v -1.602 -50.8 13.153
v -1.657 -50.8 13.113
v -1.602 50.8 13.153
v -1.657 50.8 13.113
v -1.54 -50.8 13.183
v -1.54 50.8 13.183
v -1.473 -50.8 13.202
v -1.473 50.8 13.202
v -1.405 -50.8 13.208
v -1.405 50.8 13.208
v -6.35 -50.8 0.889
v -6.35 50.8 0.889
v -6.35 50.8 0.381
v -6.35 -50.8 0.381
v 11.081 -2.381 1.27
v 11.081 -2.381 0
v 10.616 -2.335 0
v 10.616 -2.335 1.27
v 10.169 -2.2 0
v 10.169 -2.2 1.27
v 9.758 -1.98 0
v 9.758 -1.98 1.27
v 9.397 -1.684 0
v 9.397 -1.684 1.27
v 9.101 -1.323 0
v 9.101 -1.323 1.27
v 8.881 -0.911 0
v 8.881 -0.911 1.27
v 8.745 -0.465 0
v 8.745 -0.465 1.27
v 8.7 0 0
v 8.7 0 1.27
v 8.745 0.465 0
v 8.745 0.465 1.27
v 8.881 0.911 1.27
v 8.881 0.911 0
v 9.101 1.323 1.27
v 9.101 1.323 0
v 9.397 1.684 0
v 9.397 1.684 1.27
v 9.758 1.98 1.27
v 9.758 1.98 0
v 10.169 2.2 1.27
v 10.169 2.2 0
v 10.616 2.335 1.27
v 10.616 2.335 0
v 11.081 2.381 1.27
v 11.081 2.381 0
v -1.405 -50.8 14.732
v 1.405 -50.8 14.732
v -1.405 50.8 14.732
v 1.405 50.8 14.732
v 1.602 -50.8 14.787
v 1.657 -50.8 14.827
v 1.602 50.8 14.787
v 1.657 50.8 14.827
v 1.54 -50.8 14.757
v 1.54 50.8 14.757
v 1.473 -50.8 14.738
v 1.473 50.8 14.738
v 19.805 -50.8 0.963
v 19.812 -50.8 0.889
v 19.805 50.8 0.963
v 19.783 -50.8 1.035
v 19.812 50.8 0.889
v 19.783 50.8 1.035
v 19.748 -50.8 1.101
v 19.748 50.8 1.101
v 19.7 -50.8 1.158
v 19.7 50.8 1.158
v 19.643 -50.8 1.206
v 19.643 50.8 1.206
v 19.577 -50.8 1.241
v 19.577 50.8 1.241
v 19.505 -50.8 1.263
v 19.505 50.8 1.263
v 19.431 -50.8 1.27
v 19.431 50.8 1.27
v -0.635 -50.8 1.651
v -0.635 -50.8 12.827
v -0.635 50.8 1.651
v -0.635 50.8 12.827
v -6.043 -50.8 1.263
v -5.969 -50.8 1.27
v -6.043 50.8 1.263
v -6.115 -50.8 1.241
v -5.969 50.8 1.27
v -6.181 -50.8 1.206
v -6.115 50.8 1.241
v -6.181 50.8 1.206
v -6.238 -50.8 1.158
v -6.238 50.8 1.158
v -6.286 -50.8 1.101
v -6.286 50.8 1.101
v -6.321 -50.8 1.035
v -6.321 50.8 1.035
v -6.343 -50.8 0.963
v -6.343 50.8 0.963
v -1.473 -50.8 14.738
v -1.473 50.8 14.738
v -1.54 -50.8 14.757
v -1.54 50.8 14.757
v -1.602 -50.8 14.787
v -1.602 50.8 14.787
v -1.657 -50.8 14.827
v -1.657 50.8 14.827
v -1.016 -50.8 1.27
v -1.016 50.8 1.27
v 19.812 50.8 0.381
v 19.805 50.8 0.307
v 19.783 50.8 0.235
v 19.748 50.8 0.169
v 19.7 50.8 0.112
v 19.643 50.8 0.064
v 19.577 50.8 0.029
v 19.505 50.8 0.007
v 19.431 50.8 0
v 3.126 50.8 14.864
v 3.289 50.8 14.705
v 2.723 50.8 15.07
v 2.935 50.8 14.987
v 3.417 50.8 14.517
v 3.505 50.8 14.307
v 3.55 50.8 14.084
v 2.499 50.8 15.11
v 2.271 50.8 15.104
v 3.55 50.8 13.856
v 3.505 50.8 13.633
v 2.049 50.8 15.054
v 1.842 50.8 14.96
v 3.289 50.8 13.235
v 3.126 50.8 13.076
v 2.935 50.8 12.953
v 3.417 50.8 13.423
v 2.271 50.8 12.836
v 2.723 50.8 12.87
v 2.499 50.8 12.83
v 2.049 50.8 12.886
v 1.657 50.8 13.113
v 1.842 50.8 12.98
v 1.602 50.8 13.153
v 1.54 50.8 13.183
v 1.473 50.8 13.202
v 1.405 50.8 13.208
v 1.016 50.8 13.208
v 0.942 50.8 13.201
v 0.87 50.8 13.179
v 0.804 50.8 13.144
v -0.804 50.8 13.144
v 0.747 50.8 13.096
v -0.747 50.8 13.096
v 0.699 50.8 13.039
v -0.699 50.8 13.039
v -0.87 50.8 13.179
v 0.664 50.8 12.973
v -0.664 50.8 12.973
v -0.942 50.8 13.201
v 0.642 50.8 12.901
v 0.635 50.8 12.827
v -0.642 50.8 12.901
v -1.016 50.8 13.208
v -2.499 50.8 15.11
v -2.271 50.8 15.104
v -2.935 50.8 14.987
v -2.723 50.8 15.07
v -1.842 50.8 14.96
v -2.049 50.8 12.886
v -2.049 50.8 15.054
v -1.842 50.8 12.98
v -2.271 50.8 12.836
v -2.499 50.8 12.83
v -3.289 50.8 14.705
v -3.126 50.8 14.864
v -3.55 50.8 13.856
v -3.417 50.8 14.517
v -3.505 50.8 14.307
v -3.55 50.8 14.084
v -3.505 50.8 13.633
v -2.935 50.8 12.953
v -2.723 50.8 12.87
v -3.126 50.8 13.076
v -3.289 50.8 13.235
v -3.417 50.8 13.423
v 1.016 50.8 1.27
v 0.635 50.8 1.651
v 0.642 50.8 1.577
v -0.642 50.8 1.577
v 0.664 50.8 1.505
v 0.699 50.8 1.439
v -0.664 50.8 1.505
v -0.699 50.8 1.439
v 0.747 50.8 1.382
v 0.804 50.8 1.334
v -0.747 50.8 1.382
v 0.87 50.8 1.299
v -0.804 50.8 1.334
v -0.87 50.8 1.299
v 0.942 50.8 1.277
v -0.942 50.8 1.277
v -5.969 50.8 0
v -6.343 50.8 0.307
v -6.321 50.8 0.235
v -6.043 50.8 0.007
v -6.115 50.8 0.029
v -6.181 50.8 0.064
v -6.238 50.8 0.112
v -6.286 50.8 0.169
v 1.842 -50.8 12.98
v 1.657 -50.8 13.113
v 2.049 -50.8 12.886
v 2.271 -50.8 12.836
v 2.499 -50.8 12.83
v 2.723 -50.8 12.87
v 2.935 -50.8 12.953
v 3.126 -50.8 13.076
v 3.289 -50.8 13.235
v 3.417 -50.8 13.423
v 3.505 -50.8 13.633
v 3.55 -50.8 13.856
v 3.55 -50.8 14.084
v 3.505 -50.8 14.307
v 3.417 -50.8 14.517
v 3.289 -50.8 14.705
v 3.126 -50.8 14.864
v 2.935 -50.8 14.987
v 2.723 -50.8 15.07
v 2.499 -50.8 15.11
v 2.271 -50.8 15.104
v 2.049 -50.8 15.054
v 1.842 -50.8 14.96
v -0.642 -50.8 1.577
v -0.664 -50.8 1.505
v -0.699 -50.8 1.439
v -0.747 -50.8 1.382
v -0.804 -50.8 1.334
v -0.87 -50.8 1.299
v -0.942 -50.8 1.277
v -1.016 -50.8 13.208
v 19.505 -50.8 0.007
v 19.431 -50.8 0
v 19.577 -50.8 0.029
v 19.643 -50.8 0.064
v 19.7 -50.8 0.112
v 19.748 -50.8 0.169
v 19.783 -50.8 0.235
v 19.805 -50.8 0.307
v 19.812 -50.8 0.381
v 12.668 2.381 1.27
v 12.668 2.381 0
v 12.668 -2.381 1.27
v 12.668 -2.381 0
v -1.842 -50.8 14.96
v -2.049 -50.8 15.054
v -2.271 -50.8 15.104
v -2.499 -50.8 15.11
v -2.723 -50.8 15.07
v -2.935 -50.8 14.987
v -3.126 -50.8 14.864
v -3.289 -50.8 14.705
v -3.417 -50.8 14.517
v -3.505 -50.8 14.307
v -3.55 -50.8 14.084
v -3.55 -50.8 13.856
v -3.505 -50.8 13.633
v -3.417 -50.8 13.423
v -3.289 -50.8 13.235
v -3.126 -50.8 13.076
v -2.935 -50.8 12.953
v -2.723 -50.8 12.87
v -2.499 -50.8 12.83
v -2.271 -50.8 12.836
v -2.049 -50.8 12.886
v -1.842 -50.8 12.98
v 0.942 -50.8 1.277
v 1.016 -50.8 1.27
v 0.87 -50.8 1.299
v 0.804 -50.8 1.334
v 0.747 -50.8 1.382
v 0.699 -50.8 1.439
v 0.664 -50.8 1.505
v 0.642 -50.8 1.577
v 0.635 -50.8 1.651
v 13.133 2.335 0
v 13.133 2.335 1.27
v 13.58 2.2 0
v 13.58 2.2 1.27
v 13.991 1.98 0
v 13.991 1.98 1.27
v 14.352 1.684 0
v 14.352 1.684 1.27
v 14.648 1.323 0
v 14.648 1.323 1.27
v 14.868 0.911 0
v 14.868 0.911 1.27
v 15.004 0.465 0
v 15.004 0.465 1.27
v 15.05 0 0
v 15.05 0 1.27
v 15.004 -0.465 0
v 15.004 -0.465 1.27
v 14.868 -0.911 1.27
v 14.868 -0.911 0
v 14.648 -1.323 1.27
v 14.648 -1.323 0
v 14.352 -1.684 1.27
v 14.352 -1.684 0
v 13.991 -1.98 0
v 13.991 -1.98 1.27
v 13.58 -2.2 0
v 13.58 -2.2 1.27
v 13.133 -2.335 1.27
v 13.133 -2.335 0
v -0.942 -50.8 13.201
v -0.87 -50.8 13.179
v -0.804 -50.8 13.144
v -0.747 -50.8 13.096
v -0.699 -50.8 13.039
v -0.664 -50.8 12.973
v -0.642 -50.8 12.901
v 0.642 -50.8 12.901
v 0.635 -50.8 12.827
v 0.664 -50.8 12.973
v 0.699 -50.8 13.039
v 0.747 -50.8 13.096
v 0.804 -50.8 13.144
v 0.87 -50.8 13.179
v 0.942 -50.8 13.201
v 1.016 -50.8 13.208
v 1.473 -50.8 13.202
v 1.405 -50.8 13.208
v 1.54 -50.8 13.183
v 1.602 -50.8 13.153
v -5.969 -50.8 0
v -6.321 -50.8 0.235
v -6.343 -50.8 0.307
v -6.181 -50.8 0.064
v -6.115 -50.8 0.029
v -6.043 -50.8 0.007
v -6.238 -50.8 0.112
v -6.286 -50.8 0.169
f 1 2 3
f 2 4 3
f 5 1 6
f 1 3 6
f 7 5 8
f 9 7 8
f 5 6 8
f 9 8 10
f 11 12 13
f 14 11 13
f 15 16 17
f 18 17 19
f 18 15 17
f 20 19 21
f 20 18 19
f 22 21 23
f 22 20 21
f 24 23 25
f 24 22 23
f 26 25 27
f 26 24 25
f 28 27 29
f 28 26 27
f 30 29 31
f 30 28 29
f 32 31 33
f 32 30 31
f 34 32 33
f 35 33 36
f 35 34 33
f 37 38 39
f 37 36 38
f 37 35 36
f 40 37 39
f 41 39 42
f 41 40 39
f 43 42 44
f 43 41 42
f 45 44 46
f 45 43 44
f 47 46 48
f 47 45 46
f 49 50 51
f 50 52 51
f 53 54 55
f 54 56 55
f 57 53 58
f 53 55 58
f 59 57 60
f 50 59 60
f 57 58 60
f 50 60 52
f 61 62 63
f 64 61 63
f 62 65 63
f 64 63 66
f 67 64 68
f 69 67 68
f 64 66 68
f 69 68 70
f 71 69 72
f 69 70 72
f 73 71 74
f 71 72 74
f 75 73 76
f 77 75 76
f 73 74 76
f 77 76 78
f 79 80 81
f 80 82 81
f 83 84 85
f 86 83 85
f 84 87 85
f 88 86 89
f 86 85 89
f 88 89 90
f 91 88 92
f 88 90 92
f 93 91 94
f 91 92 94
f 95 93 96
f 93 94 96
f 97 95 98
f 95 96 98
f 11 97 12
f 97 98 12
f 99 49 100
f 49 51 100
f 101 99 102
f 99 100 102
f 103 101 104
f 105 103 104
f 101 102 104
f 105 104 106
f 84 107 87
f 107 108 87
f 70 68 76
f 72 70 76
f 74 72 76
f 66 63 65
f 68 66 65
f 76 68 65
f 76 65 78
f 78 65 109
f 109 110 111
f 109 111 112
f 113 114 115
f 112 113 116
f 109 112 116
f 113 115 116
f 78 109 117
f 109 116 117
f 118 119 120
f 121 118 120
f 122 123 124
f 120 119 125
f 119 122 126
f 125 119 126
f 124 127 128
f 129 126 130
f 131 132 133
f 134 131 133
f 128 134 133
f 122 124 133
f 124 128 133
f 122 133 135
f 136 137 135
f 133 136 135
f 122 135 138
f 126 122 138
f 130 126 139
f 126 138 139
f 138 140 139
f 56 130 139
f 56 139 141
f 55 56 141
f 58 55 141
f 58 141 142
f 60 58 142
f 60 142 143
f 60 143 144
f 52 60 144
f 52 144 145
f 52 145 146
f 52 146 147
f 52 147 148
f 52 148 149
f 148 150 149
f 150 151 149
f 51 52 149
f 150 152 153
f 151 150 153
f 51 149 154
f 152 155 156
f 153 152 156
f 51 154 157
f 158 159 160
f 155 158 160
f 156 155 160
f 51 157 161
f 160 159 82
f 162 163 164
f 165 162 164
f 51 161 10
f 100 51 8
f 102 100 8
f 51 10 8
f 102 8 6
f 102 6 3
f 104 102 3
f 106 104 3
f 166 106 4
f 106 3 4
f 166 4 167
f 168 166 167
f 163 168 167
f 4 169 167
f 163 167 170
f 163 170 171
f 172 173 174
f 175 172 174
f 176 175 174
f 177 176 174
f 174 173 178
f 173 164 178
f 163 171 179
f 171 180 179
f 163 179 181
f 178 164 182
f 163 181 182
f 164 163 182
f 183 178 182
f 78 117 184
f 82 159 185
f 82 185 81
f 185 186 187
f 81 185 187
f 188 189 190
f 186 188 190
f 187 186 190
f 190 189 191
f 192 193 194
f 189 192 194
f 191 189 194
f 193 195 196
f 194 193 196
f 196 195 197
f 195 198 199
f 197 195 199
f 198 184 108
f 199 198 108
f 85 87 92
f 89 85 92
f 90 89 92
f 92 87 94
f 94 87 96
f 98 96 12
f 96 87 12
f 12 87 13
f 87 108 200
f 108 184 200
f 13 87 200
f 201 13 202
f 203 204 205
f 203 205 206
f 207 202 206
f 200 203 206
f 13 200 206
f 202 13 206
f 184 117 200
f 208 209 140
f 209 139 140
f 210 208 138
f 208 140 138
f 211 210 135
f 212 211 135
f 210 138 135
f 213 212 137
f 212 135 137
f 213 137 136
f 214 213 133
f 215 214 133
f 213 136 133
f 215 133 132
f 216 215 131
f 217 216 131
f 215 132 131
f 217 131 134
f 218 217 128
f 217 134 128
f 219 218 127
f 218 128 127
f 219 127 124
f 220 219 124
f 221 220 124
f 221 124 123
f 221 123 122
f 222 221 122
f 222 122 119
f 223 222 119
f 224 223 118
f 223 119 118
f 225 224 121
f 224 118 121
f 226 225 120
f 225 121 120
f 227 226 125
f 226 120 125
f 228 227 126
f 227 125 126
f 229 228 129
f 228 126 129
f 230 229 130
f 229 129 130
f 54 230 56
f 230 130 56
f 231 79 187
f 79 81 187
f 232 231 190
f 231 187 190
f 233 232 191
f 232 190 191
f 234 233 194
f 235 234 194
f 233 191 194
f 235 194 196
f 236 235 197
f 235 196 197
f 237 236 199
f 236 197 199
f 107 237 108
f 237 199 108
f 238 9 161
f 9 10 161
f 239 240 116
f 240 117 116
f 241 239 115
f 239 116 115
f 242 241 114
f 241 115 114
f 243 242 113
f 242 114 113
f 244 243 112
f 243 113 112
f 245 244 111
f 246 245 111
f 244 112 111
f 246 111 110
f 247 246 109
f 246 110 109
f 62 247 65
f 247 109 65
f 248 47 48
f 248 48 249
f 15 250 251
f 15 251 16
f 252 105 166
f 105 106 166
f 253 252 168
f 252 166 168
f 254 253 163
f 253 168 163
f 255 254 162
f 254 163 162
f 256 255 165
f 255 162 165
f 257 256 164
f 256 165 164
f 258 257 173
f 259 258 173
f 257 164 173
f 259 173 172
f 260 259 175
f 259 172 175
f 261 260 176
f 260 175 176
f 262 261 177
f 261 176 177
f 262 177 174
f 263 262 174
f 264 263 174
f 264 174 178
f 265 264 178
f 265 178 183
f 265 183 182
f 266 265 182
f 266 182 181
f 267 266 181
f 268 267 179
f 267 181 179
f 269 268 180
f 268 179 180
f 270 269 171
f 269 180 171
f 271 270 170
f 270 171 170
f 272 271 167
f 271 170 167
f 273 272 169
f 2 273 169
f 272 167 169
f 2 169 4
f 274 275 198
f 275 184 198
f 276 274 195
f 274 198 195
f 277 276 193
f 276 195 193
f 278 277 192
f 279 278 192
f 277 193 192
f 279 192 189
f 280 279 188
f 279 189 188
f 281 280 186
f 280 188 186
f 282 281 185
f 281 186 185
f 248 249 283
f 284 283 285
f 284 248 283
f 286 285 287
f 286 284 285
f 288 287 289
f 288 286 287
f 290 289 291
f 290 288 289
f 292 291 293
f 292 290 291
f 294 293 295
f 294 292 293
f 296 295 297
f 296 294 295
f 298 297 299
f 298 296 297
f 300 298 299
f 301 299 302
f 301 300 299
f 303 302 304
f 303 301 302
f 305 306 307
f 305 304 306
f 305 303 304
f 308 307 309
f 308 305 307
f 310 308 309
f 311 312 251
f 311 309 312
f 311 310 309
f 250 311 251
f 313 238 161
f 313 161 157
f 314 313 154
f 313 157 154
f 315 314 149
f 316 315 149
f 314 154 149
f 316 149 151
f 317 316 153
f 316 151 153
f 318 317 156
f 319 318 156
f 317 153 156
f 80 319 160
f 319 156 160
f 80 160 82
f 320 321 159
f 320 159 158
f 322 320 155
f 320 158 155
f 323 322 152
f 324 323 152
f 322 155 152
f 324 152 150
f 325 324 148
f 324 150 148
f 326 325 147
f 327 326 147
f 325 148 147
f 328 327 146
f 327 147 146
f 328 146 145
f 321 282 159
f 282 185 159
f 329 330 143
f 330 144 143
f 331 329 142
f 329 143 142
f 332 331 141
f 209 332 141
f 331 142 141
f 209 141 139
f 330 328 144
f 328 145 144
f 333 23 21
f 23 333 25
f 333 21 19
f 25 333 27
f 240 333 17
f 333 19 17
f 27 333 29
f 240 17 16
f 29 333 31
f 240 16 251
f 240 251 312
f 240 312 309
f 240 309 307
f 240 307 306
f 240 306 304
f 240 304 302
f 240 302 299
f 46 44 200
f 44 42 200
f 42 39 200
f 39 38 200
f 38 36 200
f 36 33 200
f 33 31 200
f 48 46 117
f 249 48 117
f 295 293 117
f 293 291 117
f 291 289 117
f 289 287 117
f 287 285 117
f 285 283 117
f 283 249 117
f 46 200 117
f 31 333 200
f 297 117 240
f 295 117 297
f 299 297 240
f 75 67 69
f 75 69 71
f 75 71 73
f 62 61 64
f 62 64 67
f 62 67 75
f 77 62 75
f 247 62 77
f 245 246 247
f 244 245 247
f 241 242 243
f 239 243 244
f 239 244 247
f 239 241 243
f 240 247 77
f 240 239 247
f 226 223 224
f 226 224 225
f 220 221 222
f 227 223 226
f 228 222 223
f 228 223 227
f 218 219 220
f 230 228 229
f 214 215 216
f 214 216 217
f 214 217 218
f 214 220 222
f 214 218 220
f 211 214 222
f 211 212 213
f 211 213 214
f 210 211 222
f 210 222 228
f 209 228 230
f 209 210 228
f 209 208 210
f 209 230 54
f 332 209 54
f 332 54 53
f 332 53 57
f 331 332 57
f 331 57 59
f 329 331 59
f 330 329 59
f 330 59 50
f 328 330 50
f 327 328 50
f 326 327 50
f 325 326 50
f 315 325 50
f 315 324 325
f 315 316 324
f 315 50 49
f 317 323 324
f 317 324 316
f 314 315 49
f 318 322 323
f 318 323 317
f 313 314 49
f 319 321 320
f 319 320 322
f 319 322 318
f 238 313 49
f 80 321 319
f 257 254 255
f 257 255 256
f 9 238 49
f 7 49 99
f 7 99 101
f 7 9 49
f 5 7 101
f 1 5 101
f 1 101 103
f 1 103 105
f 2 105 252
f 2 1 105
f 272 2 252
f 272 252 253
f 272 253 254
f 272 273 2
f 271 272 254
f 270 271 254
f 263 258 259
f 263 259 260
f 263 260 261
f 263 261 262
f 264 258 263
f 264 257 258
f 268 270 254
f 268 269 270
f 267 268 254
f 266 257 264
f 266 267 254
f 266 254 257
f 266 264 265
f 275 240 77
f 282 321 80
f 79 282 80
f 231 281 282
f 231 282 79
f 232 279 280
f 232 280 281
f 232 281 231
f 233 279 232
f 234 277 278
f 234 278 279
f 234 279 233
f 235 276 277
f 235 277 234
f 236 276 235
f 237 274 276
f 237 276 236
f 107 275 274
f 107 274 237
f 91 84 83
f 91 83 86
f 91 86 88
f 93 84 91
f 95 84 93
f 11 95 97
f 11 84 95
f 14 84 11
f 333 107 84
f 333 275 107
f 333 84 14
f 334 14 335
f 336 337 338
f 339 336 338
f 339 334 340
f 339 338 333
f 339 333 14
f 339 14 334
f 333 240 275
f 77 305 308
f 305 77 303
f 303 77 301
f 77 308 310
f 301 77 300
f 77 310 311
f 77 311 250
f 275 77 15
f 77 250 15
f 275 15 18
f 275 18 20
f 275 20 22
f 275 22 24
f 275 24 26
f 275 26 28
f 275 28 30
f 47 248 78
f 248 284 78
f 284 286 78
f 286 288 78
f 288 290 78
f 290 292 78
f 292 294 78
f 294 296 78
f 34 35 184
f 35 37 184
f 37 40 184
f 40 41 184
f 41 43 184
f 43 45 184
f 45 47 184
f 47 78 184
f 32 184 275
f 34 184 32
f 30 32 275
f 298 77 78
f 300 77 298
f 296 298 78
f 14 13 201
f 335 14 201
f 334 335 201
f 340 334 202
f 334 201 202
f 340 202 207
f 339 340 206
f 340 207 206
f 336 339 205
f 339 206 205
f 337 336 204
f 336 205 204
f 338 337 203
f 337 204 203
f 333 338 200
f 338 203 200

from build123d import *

# Parameters (mm, degrees)
BOSS_EXTRUDE1_DEPTH = 50.8
CUT_EXTRUDE1_DEPTH  = 2.27


with BuildPart() as part:
    # Sketch2 → Boss-Extrude1 (new body, symmetric)
    with BuildSketch(Plane(origin=(0, 0, 0), x_dir=(1, 0, 0), z_dir=(0, 1, 0))):
        with BuildLine():
            Line((-5.969, 0), (19.431, 0))
            ThreePointArc((19.431, 0), (19.700407684, -0.111592316), (19.812, -0.381))
            Line((19.812, -0.381), (19.812, -0.889))
            ThreePointArc((19.812, -0.889), (19.700407684, -1.158407684), (19.431, -1.27))
            Line((19.431, -1.27), (1.016, -1.27))
            ThreePointArc((1.016, -1.27), (0.746592316, -1.381592316), (0.635, -1.651))
            Line((0.635, -1.651), (0.635, -12.827))
            ThreePointArc((0.635, -12.827), (0.746592316, -13.096407684), (1.016, -13.208))
            Line((1.016, -13.208), (1.40496875, -13.208))
            ThreePointArc((1.40496875, -13.208), (1.539672592, -13.183392866), (1.656976563, -13.11275))
            ThreePointArc((1.656976563, -13.11275), (3.556, -13.97), (1.656976563, -14.82725))
            ThreePointArc((1.656976563, -14.82725), (1.539672592, -14.756607134), (1.40496875, -14.732))
            Line((1.40496875, -14.732), (-1.40496875, -14.732))
            ThreePointArc((-1.40496875, -14.732), (-1.539672592, -14.756607134), (-1.656976563, -14.82725))
            ThreePointArc((-1.656976563, -14.82725), (-3.556, -13.97), (-1.656976563, -13.11275))
            ThreePointArc((-1.656976563, -13.11275), (-1.539672592, -13.183392866), (-1.40496875, -13.208))
            Line((-1.40496875, -13.208), (-1.016, -13.208))
            ThreePointArc((-1.016, -13.208), (-0.746592316, -13.096407684), (-0.635, -12.827))
            Line((-0.635, -12.827), (-0.635, -1.651))
            ThreePointArc((-0.635, -1.651), (-0.746592316, -1.381592316), (-1.016, -1.27))
            Line((-1.016, -1.27), (-5.969, -1.27))
            ThreePointArc((-5.969, -1.27), (-6.238407684, -1.158407684), (-6.35, -0.889))
            Line((-6.35, -0.889), (-6.35, -0.381))
            ThreePointArc((-6.35, -0.381), (-6.238407684, -0.111592316), (-5.969, 0))
        make_face()
    extrude(amount=BOSS_EXTRUDE1_DEPTH, both=True)

    # Sketch3 → Cut-Extrude1 (cut, through all)
    with BuildSketch(Plane.XY.offset(1.27)):
        with BuildLine():
            Line((11.08075, 2.38125), (12.66825, 2.38125))
            ThreePointArc((12.66825, 2.38125), (15.0495, 0), (12.66825, -2.38125))
            Line((12.66825, -2.38125), (11.08075, -2.38125))
            ThreePointArc((11.08075, -2.38125), (8.6995, 0), (11.08075, 2.38125))
        make_face()
    extrude(amount=-CUT_EXTRUDE1_DEPTH, mode=Mode.SUBTRACT)


solid = part.part
